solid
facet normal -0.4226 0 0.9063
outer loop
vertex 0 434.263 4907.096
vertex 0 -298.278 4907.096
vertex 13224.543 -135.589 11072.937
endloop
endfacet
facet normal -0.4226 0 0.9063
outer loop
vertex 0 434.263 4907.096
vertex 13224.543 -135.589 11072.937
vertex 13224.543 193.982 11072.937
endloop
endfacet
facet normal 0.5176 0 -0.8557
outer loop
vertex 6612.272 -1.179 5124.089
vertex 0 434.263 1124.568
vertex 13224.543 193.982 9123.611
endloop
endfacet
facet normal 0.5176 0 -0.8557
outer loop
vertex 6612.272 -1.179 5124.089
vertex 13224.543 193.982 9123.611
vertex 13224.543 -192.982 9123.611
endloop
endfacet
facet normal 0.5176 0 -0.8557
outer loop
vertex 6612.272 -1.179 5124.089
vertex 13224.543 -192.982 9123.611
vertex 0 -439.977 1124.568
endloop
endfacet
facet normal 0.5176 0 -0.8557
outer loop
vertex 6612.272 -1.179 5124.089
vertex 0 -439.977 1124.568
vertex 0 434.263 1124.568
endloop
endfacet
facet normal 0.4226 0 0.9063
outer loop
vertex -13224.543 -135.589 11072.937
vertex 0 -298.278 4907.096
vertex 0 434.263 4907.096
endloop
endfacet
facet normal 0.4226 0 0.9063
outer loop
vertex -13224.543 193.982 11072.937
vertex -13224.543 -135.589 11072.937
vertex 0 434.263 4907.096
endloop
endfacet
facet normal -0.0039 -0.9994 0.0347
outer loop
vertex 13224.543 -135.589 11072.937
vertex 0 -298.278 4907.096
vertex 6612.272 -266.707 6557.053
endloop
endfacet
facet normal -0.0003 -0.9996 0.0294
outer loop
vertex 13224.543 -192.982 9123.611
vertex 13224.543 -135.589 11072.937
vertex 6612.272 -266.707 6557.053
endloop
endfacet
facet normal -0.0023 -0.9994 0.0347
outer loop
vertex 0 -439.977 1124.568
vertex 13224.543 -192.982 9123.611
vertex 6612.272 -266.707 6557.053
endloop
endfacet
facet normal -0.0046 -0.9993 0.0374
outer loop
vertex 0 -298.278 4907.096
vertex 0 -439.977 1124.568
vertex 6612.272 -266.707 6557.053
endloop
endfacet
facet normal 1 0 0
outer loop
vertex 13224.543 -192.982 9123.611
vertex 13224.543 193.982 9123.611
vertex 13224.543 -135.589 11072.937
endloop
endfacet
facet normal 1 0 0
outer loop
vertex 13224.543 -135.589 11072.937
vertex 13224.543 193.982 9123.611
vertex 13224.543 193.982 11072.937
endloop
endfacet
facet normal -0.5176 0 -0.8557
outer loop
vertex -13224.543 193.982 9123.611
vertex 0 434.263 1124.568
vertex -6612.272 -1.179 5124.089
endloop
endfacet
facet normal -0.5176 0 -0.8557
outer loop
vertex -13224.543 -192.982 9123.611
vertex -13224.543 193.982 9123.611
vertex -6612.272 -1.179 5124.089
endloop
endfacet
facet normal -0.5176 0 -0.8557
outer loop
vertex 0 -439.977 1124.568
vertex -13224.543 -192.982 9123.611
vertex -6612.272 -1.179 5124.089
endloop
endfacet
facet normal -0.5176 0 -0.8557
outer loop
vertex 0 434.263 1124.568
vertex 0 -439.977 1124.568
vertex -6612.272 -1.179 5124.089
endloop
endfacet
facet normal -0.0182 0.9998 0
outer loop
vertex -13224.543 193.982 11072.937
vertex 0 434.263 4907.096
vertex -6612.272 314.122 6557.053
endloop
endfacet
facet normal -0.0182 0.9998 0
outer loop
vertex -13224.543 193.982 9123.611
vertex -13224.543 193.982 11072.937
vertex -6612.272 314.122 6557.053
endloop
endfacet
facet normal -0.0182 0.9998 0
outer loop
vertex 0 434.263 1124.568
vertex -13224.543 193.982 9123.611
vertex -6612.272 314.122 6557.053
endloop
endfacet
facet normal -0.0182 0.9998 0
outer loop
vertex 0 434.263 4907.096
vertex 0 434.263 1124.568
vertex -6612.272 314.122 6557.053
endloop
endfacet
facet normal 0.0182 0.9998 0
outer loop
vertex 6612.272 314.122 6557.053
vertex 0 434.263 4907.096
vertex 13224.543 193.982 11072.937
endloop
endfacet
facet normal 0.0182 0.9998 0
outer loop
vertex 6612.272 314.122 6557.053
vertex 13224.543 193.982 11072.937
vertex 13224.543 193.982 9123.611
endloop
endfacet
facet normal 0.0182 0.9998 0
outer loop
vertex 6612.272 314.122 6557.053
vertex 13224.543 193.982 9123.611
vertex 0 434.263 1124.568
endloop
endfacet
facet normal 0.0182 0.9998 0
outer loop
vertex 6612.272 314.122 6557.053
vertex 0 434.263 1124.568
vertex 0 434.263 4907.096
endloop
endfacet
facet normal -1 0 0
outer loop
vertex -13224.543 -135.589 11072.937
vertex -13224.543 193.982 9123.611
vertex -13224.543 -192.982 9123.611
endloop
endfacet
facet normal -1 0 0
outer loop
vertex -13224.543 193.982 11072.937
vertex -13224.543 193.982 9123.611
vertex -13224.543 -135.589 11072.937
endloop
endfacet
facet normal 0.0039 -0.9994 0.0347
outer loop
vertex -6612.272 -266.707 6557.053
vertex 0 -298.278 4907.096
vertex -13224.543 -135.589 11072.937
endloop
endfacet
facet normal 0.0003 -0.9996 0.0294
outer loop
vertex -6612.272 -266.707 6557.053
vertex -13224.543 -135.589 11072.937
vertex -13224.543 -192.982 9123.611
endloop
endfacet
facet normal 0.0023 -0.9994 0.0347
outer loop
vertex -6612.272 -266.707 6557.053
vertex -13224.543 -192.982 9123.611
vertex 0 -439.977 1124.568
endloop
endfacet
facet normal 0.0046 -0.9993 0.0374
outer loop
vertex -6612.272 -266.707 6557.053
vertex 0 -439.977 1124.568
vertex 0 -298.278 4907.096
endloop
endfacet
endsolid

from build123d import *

# Parameters (mm, degrees)
SKETCH4_W          = 14986.678438392
SKETCH4_H          = 7706.357590778
CUT_EXTRUDE1_DEPTH = 5181.6


with BuildPart() as part:
    # Surface-Knit3: read off the stored shape, not the designer's step
    # Surface-Knit3: loft between two sections, ruled curve by curve
    surface_knit3_from = [
        Edge.make_bspline([(-17711.940475464, -80.385008706, 13165.151542886), (-17711.940475464, -85.182687055, 12943.938602187), (-17711.940475464, -89.980365404, 12722.725661487), (-17711.940475464, -99.575722103, 12280.299780089), (-17711.940475464, -104.373400452, 12059.086839389), (-17711.940475464, -109.171078801, 11837.87389869)], [0, 0, 0, 0, 0.5, 0.5, 1, 1, 1, 1], 3),
        Edge.make_line((-17711.940475464, -80.385008706, 13165.151542886), (-17711.940475464, 112.448931944, 13165.151542886)),
        Edge.make_line((-17711.940475464, 112.448931944, 11837.87389869), (-17711.940475464, -109.171078801, 11837.87389869)),
        Edge.make_line((-17711.940475464, 112.448931944, 13165.151542886), (-17711.940475464, 112.448931944, 11837.87389869)),
    ]
    surface_knit3_to = [
        Edge.make_bspline([(0, -298.277774529, 4907.09615841), (0, -321.894328297, 4276.674740223), (0, -345.510882066, 3646.253322036), (0, -392.743989603, 2385.410485661), (0, -416.360543372, 1754.989067474), (0, -439.977097141, 1124.567649286)], [0, 0, 0, 0, 0.5, 0.5, 1, 1, 1, 1], 3),
        Edge.make_line((0, -298.277774529, 4907.09615841), (0, 434.262669848, 4907.09615841)),
        Edge.make_line((0, 434.262669848, 1124.567649286), (0, -439.977097141, 1124.567649286)),
        Edge.make_line((0, 434.262669848, 4907.09615841), (0, 434.262669848, 1124.567649286)),
    ]
    surface_knit3 = Solid(Shell([*[Face.make_surface_from_curves(surface_knit3_from[k], surface_knit3_to[k]) for k in range(4)], Face(Wire(surface_knit3_from)), Face(Wire(surface_knit3_to))]))
    add(surface_knit3)

    # Sketch4 → Cut-Extrude1 (cut, along a direction that is not the sketch's normal)
    with BuildSketch(Plane.ZY.offset(17711.940475464)):
        with Locations((12517.353947819, -161.456903525)):
            Rectangle(SKETCH4_W, SKETCH4_H)
    extrude(amount=-CUT_EXTRUDE1_DEPTH, dir=(-0.8660254037844378, 0, 0.5000000000000014), mode=Mode.SUBTRACT)

    # Mirror1: part across plane


with BuildPart() as part_1:
    add(part.part)
    add(part.part.mirror(Plane(origin=(0, 0, 0), x_dir=(0, 0, 1), z_dir=(1, 0, 0))))


solid = part_1.part
